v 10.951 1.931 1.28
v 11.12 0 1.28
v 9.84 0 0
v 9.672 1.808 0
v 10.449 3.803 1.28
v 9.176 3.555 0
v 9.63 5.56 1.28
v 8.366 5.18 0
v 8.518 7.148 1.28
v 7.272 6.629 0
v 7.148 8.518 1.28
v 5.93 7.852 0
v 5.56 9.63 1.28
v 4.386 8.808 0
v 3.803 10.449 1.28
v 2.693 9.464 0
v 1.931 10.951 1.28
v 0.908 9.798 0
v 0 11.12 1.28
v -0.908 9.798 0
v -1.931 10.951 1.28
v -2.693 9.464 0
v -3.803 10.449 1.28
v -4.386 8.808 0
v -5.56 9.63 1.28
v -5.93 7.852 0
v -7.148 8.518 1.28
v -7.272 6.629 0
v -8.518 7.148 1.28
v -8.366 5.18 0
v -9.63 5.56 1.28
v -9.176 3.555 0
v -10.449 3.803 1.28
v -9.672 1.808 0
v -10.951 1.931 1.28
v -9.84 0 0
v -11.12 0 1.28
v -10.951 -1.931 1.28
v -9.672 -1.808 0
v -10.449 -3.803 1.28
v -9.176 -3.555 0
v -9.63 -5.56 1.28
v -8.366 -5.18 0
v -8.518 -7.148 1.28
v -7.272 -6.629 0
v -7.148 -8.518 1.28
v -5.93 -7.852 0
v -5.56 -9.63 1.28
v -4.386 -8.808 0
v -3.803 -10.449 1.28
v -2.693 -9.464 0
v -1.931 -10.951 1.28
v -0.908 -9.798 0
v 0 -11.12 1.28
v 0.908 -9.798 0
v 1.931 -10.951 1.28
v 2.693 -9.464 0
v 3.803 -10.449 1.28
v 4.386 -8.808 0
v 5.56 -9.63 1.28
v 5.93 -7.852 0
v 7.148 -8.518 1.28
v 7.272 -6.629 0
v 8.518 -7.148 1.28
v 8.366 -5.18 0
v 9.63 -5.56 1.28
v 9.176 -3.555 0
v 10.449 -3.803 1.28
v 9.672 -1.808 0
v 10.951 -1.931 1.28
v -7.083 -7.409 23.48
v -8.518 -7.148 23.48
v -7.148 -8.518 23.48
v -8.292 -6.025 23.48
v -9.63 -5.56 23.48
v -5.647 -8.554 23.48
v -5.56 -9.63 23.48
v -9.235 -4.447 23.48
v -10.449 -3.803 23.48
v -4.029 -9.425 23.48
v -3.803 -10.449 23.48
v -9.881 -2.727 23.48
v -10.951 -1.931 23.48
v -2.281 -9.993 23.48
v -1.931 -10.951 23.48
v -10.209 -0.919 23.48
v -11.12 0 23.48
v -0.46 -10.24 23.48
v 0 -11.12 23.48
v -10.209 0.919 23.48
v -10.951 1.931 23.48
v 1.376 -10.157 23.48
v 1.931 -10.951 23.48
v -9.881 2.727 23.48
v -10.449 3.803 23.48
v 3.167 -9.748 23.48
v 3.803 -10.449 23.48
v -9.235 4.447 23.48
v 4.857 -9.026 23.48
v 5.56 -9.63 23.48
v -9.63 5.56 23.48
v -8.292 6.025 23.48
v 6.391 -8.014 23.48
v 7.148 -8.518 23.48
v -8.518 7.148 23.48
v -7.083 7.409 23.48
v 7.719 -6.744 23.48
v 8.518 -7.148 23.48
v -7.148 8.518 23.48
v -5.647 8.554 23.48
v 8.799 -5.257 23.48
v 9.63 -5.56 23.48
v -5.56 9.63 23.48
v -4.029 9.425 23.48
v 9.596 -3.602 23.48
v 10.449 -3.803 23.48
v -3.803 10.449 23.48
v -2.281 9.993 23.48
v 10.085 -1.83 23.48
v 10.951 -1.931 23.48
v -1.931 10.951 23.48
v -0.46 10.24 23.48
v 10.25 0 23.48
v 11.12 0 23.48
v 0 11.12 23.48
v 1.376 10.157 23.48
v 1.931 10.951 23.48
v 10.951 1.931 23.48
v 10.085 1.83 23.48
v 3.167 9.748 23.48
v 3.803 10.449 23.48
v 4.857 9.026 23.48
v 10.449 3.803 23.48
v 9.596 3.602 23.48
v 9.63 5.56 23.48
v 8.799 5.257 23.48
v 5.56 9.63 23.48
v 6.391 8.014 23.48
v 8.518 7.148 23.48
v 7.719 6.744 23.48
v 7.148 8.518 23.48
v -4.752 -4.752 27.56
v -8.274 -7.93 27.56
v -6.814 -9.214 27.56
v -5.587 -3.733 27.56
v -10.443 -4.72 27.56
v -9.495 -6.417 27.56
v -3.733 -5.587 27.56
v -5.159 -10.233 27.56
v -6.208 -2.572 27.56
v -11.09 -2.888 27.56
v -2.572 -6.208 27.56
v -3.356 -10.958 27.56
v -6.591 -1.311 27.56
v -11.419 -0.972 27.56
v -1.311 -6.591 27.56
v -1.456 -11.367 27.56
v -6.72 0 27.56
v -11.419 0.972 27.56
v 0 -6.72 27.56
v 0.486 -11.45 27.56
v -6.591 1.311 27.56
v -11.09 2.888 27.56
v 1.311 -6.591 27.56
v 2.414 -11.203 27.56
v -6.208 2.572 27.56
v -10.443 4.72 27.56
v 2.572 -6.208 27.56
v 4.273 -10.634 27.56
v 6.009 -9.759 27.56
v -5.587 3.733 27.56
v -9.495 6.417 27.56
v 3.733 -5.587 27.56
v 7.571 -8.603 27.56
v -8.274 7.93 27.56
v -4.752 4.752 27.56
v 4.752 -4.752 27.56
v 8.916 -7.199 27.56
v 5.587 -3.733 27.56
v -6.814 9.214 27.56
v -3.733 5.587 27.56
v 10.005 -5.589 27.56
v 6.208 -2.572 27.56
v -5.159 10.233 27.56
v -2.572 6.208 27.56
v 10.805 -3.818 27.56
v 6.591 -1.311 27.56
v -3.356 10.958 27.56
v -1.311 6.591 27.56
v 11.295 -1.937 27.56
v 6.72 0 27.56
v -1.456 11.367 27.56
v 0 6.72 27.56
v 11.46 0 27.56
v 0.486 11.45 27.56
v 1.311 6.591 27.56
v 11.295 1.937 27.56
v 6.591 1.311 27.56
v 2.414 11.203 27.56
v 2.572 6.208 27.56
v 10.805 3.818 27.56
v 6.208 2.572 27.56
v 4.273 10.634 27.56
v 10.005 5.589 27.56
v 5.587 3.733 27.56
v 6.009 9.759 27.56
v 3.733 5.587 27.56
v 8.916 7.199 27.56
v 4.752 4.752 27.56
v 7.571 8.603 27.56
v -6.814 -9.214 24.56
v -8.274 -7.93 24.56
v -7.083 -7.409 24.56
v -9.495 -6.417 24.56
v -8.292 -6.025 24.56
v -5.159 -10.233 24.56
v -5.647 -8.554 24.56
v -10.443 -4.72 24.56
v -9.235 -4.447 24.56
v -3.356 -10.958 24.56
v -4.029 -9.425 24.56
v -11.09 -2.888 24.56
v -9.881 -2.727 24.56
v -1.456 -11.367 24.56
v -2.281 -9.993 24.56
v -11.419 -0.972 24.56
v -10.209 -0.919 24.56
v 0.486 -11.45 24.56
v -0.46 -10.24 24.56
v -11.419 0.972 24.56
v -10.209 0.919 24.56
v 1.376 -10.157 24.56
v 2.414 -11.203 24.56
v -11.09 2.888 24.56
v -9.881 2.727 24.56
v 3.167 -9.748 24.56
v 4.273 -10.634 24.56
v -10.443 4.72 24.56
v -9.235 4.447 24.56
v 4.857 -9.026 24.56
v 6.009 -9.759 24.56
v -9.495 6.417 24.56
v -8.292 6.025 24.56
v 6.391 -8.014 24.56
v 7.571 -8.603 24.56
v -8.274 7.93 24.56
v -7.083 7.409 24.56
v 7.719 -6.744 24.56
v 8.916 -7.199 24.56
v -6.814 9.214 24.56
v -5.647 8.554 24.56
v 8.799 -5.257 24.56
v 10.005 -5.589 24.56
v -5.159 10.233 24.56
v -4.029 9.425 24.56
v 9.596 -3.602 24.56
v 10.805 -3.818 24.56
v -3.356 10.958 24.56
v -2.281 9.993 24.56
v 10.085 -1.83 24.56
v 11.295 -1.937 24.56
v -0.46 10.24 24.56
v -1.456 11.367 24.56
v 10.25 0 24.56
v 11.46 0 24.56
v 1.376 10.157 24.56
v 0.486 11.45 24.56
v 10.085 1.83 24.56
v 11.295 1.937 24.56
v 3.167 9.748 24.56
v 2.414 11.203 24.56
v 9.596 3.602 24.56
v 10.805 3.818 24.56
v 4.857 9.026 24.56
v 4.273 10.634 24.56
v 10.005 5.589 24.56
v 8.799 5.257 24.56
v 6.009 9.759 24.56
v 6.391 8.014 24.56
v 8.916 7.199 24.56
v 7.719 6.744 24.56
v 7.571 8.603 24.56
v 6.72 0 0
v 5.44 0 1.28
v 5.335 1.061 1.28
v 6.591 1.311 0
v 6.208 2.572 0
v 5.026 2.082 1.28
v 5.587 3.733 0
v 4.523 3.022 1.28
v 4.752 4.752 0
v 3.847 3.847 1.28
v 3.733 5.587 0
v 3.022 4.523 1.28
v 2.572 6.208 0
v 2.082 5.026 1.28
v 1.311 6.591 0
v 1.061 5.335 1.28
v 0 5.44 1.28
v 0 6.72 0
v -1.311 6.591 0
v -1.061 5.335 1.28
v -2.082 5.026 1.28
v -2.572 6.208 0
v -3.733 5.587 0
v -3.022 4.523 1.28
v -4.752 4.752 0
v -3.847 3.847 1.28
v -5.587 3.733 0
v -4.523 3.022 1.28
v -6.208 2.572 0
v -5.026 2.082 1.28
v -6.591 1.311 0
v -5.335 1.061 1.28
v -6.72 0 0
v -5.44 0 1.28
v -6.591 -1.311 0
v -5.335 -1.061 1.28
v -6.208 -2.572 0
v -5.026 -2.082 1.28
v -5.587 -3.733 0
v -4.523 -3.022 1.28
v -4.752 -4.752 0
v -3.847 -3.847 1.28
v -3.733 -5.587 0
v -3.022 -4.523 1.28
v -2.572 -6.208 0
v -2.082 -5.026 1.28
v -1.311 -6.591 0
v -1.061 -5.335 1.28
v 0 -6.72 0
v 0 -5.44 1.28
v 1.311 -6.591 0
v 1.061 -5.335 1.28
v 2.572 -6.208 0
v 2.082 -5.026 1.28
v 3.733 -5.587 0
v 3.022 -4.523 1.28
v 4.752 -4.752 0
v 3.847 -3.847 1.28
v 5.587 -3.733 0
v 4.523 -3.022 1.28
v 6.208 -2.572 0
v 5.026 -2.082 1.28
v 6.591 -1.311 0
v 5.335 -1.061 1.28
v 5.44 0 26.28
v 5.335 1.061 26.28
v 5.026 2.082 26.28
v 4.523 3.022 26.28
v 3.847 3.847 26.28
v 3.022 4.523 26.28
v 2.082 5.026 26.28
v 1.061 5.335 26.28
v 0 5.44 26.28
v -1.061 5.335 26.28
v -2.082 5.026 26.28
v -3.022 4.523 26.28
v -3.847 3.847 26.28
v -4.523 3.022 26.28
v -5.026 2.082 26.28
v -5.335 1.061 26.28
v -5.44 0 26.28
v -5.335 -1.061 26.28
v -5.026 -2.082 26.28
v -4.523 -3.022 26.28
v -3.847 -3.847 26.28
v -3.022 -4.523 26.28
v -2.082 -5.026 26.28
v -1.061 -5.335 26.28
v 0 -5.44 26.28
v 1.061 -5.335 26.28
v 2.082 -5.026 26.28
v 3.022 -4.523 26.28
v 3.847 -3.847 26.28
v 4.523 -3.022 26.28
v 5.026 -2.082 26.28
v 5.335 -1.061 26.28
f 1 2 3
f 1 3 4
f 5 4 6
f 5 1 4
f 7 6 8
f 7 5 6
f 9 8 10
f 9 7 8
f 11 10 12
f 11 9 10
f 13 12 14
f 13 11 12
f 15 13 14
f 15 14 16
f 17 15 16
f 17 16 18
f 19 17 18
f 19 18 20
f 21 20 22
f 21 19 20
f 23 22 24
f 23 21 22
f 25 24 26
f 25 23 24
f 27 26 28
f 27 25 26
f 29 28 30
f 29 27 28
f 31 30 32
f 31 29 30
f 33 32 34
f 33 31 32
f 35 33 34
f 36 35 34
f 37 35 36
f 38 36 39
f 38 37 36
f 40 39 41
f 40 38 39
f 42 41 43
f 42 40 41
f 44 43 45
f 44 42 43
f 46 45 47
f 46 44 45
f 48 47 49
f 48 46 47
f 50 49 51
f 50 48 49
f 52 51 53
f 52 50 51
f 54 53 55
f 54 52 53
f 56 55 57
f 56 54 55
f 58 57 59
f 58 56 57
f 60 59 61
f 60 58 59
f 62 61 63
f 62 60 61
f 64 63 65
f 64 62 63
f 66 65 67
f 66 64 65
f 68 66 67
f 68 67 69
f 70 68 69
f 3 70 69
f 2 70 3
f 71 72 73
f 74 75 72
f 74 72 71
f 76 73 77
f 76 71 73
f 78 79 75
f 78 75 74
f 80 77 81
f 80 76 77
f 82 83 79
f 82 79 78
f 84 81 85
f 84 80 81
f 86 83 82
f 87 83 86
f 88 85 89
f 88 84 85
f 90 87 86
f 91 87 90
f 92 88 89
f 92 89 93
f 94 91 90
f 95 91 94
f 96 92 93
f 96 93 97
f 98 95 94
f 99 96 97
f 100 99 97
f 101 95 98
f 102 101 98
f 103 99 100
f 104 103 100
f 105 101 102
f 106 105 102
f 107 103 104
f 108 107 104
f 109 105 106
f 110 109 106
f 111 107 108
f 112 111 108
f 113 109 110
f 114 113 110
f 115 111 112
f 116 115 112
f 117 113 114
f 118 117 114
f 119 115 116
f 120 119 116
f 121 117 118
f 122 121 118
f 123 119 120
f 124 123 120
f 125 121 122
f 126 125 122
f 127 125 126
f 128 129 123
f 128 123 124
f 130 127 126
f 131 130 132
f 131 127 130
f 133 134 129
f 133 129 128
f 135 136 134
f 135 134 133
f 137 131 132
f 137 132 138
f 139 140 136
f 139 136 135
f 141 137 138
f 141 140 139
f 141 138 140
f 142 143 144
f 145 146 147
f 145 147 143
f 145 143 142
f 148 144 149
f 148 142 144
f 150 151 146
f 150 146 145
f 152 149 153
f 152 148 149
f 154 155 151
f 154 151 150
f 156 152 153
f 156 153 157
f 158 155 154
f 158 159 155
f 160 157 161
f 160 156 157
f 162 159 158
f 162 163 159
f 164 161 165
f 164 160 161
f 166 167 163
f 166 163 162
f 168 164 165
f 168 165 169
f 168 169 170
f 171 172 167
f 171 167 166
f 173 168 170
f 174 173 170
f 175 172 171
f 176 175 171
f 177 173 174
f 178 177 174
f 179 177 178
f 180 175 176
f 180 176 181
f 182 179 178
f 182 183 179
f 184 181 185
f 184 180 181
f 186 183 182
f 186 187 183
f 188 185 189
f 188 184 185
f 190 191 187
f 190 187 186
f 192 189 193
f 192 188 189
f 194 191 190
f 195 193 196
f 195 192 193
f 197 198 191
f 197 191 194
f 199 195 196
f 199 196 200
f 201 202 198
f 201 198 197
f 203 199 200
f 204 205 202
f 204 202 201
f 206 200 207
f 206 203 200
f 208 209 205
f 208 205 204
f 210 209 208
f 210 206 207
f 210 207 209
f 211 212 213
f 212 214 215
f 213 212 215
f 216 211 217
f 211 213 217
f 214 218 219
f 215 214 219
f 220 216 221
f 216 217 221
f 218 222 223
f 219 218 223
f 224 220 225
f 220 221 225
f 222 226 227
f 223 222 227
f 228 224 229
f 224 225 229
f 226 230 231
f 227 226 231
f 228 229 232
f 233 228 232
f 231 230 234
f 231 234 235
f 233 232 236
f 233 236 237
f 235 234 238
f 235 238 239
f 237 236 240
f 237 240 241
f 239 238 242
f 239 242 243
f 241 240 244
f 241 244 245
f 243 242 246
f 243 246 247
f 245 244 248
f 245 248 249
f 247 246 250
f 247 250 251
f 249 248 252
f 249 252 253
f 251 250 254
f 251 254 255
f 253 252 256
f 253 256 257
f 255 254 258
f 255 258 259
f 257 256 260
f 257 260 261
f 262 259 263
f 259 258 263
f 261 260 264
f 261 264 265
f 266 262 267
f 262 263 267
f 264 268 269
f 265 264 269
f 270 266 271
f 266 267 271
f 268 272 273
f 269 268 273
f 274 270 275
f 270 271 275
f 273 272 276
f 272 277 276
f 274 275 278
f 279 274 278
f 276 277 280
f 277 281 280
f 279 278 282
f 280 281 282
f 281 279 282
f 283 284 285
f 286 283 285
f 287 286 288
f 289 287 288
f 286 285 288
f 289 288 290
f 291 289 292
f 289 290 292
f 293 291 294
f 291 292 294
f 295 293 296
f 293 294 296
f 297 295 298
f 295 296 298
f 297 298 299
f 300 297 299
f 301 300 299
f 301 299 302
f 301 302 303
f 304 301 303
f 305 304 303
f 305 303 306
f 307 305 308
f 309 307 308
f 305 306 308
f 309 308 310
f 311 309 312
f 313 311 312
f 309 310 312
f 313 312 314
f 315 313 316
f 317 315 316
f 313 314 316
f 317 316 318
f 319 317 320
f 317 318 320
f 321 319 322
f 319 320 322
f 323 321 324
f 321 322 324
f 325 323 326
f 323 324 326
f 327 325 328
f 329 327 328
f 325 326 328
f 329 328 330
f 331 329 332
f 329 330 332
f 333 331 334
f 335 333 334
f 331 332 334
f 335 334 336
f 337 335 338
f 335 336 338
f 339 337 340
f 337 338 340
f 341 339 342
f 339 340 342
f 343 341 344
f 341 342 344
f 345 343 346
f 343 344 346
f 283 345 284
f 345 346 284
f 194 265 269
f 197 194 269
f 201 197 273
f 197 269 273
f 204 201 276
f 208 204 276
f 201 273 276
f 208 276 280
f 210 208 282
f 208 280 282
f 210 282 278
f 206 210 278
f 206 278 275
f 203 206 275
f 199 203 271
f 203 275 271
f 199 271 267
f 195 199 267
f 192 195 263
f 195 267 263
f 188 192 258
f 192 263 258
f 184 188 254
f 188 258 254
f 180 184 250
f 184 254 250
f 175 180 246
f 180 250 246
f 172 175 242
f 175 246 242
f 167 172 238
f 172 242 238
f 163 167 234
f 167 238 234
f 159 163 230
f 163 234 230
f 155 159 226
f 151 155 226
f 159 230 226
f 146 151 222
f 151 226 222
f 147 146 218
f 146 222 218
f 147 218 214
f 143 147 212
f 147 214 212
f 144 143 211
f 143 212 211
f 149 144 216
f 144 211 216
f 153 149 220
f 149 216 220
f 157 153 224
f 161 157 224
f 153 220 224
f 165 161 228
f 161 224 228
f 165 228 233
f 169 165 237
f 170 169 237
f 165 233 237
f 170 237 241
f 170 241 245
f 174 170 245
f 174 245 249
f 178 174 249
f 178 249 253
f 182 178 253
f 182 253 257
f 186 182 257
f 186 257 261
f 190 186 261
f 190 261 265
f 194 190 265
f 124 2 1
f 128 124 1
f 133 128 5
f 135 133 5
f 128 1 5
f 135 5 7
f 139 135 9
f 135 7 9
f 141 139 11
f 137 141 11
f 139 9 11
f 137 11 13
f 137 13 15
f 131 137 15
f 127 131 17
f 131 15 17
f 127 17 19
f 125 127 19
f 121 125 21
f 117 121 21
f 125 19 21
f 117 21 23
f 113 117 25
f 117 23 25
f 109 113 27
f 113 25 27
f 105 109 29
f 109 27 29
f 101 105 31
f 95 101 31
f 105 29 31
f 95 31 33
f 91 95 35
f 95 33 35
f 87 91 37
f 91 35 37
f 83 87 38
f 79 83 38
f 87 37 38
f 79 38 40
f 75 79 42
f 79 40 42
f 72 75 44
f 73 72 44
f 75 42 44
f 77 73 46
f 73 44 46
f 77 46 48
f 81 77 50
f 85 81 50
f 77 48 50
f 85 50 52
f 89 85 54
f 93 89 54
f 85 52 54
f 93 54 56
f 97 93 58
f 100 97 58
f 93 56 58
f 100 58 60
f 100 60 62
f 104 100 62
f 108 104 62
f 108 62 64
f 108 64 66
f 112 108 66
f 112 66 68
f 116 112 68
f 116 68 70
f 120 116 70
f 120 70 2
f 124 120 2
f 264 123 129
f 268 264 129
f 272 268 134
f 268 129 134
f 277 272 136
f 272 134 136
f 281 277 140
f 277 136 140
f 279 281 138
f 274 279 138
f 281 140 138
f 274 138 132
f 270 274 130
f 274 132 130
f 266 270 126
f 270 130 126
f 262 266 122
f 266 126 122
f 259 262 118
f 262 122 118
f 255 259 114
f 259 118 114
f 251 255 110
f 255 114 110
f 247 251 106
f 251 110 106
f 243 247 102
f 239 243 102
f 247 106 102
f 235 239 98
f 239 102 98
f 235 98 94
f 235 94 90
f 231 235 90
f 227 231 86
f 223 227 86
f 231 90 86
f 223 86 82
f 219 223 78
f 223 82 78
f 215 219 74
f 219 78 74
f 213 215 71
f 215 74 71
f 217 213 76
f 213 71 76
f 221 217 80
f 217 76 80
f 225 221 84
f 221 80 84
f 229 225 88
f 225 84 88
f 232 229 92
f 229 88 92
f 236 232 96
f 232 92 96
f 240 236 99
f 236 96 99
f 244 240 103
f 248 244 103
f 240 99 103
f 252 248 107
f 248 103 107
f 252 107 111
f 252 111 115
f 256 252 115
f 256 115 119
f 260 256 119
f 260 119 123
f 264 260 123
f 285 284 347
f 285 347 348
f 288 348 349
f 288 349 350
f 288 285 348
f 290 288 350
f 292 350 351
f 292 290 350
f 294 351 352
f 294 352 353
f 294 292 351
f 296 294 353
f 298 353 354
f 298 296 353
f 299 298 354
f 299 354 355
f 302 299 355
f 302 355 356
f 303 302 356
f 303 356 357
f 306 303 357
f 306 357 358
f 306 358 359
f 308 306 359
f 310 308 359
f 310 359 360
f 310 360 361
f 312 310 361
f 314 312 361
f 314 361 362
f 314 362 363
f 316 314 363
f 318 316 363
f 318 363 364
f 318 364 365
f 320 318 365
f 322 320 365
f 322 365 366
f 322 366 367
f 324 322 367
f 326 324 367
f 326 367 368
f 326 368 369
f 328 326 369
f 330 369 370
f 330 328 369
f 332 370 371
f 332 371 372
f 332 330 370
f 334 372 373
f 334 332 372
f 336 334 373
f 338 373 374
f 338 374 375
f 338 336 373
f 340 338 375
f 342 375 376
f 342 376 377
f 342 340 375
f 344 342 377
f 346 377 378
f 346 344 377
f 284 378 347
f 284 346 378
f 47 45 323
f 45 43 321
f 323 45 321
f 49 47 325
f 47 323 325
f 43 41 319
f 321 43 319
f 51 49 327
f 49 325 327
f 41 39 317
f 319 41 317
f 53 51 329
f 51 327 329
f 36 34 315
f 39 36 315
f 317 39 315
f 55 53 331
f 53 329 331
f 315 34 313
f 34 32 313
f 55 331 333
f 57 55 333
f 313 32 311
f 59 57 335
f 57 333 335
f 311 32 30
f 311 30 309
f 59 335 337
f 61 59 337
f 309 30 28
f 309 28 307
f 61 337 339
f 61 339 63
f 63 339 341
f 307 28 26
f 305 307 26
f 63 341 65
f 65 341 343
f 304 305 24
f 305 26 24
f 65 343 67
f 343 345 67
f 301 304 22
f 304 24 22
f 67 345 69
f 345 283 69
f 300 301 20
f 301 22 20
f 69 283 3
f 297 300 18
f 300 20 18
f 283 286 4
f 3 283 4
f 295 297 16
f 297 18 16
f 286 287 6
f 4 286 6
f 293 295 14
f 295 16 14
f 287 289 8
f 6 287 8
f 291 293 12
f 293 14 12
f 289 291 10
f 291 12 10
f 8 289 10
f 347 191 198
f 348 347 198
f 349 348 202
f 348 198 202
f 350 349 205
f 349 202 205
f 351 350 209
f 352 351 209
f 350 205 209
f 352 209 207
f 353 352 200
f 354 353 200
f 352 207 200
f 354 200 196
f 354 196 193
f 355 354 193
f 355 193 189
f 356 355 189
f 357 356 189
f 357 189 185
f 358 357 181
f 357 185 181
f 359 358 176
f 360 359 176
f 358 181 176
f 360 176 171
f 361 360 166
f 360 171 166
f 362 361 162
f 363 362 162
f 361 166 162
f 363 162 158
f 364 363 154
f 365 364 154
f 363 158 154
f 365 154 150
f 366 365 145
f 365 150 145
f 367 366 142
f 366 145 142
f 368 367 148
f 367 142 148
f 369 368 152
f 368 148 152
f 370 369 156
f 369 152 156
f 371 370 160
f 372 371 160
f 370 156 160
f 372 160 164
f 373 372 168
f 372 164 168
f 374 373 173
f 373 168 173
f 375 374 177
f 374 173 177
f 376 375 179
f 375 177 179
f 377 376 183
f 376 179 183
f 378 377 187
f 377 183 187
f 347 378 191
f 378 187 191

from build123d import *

# Parameters (mm, degrees)
F0_R     = 11.12
F0_R_2   = 5.44
F1_DEPTH = 23.48
F3_R     = 10.25
F3_R_2   = 5.44
F4_DEPTH = 1.08
F6_R     = 11.46
F6_R_2   = 5.44
F7_DEPTH = 3
F8_SIZE  = 1.28
F9_SIZE  = 1.28
F10_SIZE = 1.28


with BuildPart() as f1:
    # F0 (on Top) → F1 (new body)
    with BuildSketch(Plane.XY):
        Circle(F0_R)
        Circle(F0_R_2, mode=Mode.SUBTRACT)
    extrude(amount=F1_DEPTH)

    # F3 (on offset) → F4 (join)
    with BuildSketch(Plane.XY.offset(23.48)):
        Circle(F3_R)
        Circle(F3_R_2, mode=Mode.SUBTRACT)
    extrude(amount=F4_DEPTH)

    # F6 (on offset) → F7 (join)
    with BuildSketch(Plane.XY.offset(24.56)):
        Circle(F6_R)
        Circle(F6_R_2, mode=Mode.SUBTRACT)
    extrude(amount=F7_DEPTH)

    # F8
    f8_edges = [f1.edges().sort_by_distance(p)[0] for p in [
        (-11.12, 0, 0),
    ]]
    chamfer(f8_edges, length=F8_SIZE)

    # F9
    f9_edges = [f1.edges().sort_by_distance(p)[0] for p in [
        (-5.44, 0, 0),
    ]]
    chamfer(f9_edges, length=F9_SIZE)

    # F10
    f10_edges = [f1.edges().sort_by_distance(p)[0] for p in [
        (-5.44, 0, 27.56),
    ]]
    chamfer(f10_edges, length=F10_SIZE)


solid = f1.part
